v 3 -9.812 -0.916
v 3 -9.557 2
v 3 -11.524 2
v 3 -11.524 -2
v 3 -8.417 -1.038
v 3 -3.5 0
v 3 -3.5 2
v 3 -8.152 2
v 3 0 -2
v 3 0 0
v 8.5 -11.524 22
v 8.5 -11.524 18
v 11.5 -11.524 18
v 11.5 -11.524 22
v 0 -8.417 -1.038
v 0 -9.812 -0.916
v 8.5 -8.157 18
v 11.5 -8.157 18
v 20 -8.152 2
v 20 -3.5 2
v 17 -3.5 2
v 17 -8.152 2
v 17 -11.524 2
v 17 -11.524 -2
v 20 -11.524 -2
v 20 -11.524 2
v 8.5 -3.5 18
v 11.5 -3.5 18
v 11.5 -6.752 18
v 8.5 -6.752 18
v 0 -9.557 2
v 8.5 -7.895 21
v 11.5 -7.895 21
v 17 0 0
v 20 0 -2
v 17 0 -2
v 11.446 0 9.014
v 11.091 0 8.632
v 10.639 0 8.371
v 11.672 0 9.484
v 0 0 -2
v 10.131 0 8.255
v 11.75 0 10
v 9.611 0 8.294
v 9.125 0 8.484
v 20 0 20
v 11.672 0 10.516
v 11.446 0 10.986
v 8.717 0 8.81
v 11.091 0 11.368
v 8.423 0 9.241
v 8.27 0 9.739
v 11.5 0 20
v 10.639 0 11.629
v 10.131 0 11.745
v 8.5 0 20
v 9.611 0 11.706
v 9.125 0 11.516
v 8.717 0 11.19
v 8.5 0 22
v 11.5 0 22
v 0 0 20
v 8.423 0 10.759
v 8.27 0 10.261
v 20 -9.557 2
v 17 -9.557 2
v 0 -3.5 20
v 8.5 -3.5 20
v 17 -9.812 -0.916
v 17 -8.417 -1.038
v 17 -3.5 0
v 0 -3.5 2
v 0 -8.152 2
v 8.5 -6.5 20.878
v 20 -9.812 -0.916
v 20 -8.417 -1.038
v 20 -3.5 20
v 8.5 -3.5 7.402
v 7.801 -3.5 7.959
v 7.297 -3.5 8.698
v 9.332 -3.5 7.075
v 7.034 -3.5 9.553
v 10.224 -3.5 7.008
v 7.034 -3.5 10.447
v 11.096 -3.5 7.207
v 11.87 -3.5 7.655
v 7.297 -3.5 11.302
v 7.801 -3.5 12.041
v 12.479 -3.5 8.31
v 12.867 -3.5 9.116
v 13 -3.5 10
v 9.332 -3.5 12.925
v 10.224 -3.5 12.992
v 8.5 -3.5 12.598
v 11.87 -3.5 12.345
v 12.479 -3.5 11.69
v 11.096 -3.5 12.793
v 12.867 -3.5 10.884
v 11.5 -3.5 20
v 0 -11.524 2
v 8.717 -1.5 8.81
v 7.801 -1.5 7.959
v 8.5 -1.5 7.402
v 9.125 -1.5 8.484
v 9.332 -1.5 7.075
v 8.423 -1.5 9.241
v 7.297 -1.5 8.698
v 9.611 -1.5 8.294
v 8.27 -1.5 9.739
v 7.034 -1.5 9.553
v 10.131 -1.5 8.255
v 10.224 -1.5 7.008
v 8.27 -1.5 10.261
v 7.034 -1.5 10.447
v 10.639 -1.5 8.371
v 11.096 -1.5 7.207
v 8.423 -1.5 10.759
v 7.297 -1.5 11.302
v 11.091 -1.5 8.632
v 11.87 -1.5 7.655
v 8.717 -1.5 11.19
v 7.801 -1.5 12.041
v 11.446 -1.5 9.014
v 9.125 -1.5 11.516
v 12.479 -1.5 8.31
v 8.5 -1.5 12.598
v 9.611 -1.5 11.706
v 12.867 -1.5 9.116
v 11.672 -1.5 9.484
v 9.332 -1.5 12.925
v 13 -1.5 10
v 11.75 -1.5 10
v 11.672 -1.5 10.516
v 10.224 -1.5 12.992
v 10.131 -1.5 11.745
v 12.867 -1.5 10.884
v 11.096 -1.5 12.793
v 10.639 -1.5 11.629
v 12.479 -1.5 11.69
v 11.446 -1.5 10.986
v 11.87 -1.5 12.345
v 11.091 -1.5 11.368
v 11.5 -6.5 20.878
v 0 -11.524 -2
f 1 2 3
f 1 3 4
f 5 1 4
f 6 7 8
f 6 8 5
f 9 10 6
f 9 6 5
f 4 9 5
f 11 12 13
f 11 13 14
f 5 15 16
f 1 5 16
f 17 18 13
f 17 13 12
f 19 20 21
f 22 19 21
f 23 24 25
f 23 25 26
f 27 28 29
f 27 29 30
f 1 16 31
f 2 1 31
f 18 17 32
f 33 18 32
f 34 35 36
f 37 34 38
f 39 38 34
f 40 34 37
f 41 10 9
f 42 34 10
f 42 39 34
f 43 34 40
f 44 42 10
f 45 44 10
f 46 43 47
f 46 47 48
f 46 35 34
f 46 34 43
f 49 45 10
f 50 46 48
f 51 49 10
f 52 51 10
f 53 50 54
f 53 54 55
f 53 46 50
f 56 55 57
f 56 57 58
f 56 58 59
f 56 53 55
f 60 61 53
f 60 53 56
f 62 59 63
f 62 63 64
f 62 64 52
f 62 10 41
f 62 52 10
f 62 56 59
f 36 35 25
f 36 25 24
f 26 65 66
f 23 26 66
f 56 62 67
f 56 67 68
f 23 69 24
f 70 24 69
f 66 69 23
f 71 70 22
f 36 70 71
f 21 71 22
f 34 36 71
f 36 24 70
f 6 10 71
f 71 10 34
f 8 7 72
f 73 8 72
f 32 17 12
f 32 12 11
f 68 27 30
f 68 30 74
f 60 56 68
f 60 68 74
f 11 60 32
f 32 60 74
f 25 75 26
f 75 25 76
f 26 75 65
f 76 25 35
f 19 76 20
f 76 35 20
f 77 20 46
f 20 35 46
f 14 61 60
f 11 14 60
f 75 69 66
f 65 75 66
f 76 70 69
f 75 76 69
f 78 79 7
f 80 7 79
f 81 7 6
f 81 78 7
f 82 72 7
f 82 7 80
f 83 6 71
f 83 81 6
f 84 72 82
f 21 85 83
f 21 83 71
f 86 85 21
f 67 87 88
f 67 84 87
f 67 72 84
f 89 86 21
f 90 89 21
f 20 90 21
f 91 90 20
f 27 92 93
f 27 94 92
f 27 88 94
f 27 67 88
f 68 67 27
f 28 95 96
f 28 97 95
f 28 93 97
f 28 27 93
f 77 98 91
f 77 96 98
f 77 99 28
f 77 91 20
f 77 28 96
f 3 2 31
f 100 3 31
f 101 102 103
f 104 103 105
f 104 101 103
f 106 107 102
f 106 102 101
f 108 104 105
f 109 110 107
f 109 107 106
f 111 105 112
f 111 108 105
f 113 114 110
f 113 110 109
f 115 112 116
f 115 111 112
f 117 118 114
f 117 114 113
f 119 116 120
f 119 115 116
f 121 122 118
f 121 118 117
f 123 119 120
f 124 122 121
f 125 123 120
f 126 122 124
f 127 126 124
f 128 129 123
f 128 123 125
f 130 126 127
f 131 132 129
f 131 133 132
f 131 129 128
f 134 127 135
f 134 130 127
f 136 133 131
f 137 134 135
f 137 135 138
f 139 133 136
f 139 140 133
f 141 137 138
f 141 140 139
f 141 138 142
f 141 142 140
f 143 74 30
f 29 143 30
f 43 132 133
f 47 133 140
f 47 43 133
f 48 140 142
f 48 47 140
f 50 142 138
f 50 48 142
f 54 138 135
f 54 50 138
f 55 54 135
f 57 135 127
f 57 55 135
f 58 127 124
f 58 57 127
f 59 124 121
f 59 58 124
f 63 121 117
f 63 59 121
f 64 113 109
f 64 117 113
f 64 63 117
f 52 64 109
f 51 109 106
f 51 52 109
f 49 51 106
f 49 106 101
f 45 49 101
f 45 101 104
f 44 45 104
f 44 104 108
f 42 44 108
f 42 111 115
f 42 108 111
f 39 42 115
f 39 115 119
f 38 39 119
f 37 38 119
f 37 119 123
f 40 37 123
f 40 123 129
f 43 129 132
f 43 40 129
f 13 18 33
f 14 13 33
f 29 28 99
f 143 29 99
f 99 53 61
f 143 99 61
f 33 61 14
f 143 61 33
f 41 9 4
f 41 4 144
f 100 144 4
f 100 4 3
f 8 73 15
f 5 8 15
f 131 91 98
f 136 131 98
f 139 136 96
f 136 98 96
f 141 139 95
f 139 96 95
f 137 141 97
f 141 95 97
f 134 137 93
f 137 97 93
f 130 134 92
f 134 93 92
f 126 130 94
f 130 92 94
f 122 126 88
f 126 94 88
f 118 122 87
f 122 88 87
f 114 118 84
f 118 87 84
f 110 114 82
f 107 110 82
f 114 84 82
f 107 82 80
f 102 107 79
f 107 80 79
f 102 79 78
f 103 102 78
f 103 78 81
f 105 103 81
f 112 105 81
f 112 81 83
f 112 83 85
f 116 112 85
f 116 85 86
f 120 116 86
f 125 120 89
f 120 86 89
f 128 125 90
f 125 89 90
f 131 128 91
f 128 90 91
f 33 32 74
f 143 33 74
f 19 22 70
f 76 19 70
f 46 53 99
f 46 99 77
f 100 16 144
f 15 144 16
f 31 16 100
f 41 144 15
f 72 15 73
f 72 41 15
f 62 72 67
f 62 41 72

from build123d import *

# Parameters (mm, degrees)
F0_W     = 20
F0_H     = 20
F0_R     = 1.75
F1_DEPTH = 3.5
F2_R     = 3
F3_DEPTH = 2
F4_W     = 3
F4_H     = 2
F4_H_2   = 4
F5_DEPTH = 15
F6_W     = 5.121377
F6_H     = 27.98892
F7_DEPTH = 25


with BuildPart() as f1:
    # F0 (on Front) → F1 (new body)
    with BuildSketch(Plane.XZ):
        with Locations((10, 10)):
            Rectangle(F0_W, F0_H)
        with Locations((10, 10)):
            Circle(F0_R, mode=Mode.SUBTRACT)
    extrude(amount=F1_DEPTH)

    # F2 (on face) → F3 (cut)
    with BuildSketch(Plane.XZ.offset(3.5)):
        with Locations((10, 10)):
            Circle(F2_R)
    extrude(amount=-F3_DEPTH, mode=Mode.SUBTRACT)

    # F4 (on face) → F5 (join)
    with BuildSketch(Plane(origin=(0, 0, 0), x_dir=(-1, 0, 0), z_dir=(0, 1, 0))):
        with Locations((-1.5, -1)):
            Rectangle(F4_W, F4_H)
        with Locations((-10, 20)):
            Rectangle(F4_W, F4_H_2)
        with Locations((-1.5, 0)):
            Rectangle(F4_W, F4_H_2)
        with Locations((-18.5, 0)):
            Rectangle(F4_W, F4_H_2)
    extrude(amount=-F5_DEPTH)

    # F6 (on face) → F7 (cut)
    with BuildSketch(Plane(origin=(0, 0, 0), x_dir=(0, -1, 0), z_dir=(-1, 0, 0))):
        Polygon((7.894673, 21), (6.5, 20.877982), (8.417426, -1.038301), (9.812099, -0.916283), align=None)
        with Locations((14.084454, 9.811153)):
            Rectangle(F6_W, F6_H)
    extrude(amount=-F7_DEPTH, mode=Mode.SUBTRACT)


solid = f1.part
